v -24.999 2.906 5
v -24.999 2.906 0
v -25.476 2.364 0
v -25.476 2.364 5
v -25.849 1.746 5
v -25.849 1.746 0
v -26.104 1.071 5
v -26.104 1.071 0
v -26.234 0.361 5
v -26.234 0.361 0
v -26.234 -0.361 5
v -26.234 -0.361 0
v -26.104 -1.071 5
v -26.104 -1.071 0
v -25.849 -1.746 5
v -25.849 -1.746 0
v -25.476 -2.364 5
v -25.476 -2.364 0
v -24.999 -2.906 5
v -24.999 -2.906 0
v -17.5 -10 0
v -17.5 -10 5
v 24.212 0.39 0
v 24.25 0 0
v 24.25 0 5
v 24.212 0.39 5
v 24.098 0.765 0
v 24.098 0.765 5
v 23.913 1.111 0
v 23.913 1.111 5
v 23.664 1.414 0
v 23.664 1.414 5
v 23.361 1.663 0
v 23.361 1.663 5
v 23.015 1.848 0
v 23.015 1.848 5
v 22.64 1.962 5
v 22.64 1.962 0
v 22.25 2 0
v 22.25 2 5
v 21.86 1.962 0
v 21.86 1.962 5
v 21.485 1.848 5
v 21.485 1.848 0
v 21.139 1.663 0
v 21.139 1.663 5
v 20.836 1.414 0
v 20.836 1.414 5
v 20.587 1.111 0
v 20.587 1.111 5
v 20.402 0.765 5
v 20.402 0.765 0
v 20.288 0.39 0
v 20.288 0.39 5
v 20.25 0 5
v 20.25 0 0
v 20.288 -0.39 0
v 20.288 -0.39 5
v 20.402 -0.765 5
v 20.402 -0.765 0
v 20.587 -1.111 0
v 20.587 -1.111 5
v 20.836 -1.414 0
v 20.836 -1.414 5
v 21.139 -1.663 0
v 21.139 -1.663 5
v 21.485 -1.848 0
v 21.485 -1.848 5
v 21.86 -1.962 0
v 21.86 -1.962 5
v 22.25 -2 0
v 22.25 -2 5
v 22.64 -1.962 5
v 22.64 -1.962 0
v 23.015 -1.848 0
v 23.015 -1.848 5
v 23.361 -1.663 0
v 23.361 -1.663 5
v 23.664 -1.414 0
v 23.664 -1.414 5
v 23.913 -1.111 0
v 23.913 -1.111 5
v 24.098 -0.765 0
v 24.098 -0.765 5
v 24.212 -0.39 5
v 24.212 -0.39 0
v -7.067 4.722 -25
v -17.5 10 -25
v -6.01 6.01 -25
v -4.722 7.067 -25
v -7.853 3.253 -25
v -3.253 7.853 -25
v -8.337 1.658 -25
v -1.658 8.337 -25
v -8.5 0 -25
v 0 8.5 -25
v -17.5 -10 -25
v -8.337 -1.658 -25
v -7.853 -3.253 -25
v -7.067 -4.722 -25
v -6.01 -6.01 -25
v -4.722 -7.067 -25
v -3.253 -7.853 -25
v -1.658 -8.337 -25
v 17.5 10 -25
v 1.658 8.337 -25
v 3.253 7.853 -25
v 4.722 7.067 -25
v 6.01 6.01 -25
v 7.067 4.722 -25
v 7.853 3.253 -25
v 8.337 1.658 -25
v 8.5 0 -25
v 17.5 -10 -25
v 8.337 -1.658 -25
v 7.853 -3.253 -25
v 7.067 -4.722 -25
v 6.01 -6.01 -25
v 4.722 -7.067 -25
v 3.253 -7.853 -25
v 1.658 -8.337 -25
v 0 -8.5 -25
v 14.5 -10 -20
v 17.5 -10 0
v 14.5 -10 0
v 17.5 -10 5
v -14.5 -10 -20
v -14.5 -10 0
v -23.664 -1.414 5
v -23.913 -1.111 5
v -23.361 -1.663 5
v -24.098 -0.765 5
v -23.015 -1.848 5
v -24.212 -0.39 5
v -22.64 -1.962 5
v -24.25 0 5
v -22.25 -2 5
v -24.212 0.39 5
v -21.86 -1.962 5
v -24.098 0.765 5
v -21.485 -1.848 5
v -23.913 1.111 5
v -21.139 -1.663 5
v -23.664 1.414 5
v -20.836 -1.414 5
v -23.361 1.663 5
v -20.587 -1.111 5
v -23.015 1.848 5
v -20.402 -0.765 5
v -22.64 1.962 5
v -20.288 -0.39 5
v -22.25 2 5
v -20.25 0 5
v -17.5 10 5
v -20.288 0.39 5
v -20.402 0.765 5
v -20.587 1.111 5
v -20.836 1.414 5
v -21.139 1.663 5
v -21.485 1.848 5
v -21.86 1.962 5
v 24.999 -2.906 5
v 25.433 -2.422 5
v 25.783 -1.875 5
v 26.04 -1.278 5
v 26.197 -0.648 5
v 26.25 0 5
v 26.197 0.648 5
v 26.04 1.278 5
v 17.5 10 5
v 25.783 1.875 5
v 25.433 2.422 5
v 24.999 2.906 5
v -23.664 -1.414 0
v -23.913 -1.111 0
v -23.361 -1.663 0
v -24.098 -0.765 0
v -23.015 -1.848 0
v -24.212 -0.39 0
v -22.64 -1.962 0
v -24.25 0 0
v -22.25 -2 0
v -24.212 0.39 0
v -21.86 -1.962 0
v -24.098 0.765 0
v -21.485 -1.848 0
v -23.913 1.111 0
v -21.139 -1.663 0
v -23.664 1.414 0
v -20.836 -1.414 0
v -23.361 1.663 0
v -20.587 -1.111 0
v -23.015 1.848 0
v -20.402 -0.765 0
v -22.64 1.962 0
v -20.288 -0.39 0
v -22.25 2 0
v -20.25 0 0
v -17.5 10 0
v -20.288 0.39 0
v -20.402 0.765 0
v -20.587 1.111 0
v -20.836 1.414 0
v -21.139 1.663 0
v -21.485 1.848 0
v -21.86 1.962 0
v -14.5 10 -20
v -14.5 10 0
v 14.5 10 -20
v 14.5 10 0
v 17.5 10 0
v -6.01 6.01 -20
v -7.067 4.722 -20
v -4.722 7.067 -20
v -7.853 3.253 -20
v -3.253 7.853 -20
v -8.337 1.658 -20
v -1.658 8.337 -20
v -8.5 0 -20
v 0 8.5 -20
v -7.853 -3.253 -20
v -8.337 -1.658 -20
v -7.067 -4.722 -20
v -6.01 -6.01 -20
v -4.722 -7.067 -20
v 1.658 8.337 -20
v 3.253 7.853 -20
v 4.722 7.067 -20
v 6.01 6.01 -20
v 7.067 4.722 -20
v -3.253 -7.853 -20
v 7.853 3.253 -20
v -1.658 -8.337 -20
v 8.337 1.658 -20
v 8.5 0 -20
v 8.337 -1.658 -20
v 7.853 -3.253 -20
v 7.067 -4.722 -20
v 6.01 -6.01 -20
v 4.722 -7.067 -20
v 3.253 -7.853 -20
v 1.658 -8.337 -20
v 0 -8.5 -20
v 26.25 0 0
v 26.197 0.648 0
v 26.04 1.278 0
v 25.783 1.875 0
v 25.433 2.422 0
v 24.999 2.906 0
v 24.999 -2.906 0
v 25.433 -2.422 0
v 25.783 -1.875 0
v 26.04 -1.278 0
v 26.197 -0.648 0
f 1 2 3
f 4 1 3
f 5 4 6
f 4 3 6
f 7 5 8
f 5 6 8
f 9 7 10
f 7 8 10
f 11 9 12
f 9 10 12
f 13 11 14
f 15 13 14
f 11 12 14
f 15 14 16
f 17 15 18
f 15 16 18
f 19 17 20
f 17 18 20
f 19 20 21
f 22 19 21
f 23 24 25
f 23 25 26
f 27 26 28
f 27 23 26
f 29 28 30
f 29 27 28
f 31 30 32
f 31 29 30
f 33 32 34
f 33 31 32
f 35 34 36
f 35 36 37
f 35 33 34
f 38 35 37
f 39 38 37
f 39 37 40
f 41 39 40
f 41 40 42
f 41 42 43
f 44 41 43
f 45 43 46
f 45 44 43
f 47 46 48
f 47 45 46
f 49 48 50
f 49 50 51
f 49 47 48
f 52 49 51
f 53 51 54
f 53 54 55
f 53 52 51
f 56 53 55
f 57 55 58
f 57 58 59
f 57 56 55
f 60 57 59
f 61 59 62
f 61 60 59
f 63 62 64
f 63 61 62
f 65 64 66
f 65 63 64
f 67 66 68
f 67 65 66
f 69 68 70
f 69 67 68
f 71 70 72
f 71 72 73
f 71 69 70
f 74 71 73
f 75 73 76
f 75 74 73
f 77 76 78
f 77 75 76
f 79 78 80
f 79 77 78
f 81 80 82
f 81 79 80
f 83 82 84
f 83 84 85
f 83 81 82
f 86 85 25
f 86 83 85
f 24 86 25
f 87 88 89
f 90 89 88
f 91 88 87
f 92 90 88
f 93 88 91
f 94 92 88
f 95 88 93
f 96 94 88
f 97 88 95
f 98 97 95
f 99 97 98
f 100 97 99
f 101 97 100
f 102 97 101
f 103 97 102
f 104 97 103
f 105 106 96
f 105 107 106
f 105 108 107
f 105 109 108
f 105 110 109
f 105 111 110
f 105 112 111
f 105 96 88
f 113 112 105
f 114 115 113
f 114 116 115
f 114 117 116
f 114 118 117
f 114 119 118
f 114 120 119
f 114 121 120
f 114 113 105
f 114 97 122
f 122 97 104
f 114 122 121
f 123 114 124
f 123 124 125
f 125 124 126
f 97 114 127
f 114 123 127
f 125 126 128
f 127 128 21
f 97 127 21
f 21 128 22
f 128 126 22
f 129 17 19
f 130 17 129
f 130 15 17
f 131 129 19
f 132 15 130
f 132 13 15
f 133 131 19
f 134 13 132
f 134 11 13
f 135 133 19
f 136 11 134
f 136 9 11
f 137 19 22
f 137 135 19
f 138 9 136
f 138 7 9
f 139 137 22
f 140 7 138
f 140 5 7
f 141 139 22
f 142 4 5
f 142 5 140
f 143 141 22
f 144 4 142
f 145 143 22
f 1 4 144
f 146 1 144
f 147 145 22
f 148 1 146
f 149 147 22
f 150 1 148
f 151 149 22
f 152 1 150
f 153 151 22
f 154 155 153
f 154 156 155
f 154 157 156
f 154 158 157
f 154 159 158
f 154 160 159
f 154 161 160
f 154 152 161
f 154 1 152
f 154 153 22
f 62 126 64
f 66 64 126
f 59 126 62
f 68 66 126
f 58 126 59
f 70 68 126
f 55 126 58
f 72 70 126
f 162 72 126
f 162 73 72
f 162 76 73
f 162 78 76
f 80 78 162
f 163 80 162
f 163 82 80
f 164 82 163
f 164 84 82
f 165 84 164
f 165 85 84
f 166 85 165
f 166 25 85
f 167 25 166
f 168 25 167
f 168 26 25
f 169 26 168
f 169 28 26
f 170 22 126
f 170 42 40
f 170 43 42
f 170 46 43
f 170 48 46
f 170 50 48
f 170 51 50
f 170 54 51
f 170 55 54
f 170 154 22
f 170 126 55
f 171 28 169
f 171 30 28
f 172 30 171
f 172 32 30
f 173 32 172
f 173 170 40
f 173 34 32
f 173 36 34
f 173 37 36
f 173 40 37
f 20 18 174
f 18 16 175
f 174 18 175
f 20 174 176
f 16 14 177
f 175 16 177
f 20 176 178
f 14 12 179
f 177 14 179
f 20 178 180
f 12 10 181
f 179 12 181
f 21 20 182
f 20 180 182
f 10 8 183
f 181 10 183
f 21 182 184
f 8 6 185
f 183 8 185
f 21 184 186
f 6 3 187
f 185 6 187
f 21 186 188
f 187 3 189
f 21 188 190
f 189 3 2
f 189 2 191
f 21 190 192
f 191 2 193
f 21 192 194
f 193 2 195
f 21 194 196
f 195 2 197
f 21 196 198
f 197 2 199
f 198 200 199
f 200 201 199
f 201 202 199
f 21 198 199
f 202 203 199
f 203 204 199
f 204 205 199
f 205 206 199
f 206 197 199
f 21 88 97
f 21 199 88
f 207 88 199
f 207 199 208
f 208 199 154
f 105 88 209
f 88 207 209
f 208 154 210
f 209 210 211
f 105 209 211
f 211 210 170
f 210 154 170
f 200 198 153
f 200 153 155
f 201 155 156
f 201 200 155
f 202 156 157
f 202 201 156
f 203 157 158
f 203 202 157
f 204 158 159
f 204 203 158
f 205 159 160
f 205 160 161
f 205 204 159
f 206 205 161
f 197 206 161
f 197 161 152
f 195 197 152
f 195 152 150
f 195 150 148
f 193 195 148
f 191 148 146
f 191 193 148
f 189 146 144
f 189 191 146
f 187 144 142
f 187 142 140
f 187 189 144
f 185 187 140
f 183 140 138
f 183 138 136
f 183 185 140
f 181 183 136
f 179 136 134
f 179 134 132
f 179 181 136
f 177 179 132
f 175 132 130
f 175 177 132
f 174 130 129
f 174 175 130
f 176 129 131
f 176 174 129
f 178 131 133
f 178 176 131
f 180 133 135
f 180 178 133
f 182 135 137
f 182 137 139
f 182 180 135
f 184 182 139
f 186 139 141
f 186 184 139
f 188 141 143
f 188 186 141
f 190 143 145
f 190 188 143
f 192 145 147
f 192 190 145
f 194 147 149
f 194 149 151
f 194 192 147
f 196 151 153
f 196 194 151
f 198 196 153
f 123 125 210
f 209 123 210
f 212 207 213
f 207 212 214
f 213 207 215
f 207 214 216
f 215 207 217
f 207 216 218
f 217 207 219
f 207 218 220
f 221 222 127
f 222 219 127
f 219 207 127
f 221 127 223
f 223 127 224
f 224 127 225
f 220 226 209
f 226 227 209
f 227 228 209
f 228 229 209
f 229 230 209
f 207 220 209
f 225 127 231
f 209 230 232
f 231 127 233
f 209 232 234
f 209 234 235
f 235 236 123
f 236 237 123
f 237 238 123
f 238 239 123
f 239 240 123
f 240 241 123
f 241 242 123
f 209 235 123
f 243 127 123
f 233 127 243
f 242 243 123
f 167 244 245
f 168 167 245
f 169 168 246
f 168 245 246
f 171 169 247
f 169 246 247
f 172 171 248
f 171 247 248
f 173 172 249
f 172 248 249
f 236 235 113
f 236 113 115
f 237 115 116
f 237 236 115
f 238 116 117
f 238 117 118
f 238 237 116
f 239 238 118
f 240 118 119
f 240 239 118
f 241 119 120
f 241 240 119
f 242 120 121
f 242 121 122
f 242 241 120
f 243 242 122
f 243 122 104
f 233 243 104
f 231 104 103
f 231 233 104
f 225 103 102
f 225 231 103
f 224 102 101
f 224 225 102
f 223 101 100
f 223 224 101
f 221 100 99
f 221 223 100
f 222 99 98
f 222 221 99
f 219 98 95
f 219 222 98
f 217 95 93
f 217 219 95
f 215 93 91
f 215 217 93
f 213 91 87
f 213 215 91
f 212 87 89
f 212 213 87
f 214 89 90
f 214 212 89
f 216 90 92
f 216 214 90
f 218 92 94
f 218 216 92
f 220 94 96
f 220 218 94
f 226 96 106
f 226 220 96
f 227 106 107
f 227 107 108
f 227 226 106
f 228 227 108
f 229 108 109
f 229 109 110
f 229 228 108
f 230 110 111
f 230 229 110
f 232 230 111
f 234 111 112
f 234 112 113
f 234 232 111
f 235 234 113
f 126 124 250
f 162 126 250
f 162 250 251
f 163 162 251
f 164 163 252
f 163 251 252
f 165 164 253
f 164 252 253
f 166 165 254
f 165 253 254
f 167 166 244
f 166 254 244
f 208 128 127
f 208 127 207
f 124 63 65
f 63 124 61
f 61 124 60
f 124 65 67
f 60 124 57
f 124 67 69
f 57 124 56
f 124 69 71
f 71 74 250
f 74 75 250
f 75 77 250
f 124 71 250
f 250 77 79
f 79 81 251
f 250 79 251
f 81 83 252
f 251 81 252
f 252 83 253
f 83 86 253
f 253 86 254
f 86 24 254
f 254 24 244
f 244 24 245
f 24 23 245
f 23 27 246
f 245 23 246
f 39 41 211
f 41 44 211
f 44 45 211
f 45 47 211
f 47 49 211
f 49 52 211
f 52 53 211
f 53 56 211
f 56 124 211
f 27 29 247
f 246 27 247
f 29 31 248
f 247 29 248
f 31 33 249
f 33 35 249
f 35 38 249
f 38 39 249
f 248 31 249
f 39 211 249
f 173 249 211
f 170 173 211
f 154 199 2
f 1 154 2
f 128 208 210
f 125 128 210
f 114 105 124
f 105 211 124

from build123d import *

# Parameters (mm, degrees)
F0_R     = 2
F0_W     = 3
F0_H     = 20
F0_W_2   = 29
F1_DEPTH = 5
F2_DEPTH = 20
F3_W     = 3
F3_H     = 20
F3_W_2   = 32
F3_R     = 8.5
F4_DEPTH = 5


with BuildPart() as f1:
    # F0 (on Top) → F1 (new body)
    with BuildSketch(Plane.XY):
        with BuildLine():
            Line((-17.5, -10), (-17.5, 10))
            Line((-17.5, 10), (-24.9989359016, 2.9057445533))
            ThreePointArc((-24.9989359016, 2.9057445533), (-20.6681883182, 3.6739449919), (-18.25, 0))
            ThreePointArc((-18.25, 0), (-20.6681883182, -3.6739449919), (-24.9989359016, -2.9057445533))
            Line((-24.9989359016, -2.9057445533), (-17.5, -10))
        make_face()
        with BuildLine():
            ThreePointArc((-18.25, 0), (-20.6681883182, 3.6739449919), (-24.9989359016, 2.9057445533))
            ThreePointArc((-24.9989359016, 2.9057445533), (-26.25, 0), (-24.9989359016, -2.9057445533))
            ThreePointArc((-24.9989359016, -2.9057445533), (-20.6681883182, -3.6739449919), (-18.25, 0))
        make_face()
        with Locations((-22.25, 0)):
            Circle(F0_R, mode=Mode.SUBTRACT)
        with Locations((-16, 0)):
            Rectangle(F0_W, F0_H)
        Rectangle(F0_W_2, F0_H)
        with Locations((16, 0)):
            Rectangle(F0_W, F0_H)
        with BuildLine():
            Line((24.9989359016, 2.9057445533), (17.5, 10))
            Line((17.5, 10), (17.5, -10))
            Line((17.5, -10), (24.9989359016, -2.9057445533))
            ThreePointArc((24.9989359016, -2.9057445533), (18.25, 0), (24.9989359016, 2.9057445533))
        make_face()
        with BuildLine():
            ThreePointArc((26.25, 0), (25.9239449919, 1.5818116818), (24.9989359016, 2.9057445533))
            ThreePointArc((24.9989359016, 2.9057445533), (18.25, 0), (24.9989359016, -2.9057445533))
            ThreePointArc((24.9989359016, -2.9057445533), (25.9239449919, -1.5818116818), (26.25, 0))
        make_face()
        with Locations((22.25, 0)):
            Circle(F0_R, mode=Mode.SUBTRACT)
    extrude(amount=F1_DEPTH)

    # F0 (on Top) → F2 (join)
    with BuildSketch(Plane.XY):
        with Locations((-16, 0)):
            Rectangle(F0_W, F0_H)
        with Locations((16, 0)):
            Rectangle(F0_W, F0_H)
    extrude(amount=-F2_DEPTH)

    # F3 (on face) → F4 (join)
    with BuildSketch(Plane(origin=(0, 0, -20), x_dir=(1, 0, 0), z_dir=(0, 0, -1))):
        with Locations((-16, 0)):
            Rectangle(F3_W, F3_H)
        with Locations((1.5, 0)):
            Rectangle(F3_W_2, F3_H)
        Circle(F3_R, mode=Mode.SUBTRACT)
    extrude(amount=F4_DEPTH)


solid = f1.part
